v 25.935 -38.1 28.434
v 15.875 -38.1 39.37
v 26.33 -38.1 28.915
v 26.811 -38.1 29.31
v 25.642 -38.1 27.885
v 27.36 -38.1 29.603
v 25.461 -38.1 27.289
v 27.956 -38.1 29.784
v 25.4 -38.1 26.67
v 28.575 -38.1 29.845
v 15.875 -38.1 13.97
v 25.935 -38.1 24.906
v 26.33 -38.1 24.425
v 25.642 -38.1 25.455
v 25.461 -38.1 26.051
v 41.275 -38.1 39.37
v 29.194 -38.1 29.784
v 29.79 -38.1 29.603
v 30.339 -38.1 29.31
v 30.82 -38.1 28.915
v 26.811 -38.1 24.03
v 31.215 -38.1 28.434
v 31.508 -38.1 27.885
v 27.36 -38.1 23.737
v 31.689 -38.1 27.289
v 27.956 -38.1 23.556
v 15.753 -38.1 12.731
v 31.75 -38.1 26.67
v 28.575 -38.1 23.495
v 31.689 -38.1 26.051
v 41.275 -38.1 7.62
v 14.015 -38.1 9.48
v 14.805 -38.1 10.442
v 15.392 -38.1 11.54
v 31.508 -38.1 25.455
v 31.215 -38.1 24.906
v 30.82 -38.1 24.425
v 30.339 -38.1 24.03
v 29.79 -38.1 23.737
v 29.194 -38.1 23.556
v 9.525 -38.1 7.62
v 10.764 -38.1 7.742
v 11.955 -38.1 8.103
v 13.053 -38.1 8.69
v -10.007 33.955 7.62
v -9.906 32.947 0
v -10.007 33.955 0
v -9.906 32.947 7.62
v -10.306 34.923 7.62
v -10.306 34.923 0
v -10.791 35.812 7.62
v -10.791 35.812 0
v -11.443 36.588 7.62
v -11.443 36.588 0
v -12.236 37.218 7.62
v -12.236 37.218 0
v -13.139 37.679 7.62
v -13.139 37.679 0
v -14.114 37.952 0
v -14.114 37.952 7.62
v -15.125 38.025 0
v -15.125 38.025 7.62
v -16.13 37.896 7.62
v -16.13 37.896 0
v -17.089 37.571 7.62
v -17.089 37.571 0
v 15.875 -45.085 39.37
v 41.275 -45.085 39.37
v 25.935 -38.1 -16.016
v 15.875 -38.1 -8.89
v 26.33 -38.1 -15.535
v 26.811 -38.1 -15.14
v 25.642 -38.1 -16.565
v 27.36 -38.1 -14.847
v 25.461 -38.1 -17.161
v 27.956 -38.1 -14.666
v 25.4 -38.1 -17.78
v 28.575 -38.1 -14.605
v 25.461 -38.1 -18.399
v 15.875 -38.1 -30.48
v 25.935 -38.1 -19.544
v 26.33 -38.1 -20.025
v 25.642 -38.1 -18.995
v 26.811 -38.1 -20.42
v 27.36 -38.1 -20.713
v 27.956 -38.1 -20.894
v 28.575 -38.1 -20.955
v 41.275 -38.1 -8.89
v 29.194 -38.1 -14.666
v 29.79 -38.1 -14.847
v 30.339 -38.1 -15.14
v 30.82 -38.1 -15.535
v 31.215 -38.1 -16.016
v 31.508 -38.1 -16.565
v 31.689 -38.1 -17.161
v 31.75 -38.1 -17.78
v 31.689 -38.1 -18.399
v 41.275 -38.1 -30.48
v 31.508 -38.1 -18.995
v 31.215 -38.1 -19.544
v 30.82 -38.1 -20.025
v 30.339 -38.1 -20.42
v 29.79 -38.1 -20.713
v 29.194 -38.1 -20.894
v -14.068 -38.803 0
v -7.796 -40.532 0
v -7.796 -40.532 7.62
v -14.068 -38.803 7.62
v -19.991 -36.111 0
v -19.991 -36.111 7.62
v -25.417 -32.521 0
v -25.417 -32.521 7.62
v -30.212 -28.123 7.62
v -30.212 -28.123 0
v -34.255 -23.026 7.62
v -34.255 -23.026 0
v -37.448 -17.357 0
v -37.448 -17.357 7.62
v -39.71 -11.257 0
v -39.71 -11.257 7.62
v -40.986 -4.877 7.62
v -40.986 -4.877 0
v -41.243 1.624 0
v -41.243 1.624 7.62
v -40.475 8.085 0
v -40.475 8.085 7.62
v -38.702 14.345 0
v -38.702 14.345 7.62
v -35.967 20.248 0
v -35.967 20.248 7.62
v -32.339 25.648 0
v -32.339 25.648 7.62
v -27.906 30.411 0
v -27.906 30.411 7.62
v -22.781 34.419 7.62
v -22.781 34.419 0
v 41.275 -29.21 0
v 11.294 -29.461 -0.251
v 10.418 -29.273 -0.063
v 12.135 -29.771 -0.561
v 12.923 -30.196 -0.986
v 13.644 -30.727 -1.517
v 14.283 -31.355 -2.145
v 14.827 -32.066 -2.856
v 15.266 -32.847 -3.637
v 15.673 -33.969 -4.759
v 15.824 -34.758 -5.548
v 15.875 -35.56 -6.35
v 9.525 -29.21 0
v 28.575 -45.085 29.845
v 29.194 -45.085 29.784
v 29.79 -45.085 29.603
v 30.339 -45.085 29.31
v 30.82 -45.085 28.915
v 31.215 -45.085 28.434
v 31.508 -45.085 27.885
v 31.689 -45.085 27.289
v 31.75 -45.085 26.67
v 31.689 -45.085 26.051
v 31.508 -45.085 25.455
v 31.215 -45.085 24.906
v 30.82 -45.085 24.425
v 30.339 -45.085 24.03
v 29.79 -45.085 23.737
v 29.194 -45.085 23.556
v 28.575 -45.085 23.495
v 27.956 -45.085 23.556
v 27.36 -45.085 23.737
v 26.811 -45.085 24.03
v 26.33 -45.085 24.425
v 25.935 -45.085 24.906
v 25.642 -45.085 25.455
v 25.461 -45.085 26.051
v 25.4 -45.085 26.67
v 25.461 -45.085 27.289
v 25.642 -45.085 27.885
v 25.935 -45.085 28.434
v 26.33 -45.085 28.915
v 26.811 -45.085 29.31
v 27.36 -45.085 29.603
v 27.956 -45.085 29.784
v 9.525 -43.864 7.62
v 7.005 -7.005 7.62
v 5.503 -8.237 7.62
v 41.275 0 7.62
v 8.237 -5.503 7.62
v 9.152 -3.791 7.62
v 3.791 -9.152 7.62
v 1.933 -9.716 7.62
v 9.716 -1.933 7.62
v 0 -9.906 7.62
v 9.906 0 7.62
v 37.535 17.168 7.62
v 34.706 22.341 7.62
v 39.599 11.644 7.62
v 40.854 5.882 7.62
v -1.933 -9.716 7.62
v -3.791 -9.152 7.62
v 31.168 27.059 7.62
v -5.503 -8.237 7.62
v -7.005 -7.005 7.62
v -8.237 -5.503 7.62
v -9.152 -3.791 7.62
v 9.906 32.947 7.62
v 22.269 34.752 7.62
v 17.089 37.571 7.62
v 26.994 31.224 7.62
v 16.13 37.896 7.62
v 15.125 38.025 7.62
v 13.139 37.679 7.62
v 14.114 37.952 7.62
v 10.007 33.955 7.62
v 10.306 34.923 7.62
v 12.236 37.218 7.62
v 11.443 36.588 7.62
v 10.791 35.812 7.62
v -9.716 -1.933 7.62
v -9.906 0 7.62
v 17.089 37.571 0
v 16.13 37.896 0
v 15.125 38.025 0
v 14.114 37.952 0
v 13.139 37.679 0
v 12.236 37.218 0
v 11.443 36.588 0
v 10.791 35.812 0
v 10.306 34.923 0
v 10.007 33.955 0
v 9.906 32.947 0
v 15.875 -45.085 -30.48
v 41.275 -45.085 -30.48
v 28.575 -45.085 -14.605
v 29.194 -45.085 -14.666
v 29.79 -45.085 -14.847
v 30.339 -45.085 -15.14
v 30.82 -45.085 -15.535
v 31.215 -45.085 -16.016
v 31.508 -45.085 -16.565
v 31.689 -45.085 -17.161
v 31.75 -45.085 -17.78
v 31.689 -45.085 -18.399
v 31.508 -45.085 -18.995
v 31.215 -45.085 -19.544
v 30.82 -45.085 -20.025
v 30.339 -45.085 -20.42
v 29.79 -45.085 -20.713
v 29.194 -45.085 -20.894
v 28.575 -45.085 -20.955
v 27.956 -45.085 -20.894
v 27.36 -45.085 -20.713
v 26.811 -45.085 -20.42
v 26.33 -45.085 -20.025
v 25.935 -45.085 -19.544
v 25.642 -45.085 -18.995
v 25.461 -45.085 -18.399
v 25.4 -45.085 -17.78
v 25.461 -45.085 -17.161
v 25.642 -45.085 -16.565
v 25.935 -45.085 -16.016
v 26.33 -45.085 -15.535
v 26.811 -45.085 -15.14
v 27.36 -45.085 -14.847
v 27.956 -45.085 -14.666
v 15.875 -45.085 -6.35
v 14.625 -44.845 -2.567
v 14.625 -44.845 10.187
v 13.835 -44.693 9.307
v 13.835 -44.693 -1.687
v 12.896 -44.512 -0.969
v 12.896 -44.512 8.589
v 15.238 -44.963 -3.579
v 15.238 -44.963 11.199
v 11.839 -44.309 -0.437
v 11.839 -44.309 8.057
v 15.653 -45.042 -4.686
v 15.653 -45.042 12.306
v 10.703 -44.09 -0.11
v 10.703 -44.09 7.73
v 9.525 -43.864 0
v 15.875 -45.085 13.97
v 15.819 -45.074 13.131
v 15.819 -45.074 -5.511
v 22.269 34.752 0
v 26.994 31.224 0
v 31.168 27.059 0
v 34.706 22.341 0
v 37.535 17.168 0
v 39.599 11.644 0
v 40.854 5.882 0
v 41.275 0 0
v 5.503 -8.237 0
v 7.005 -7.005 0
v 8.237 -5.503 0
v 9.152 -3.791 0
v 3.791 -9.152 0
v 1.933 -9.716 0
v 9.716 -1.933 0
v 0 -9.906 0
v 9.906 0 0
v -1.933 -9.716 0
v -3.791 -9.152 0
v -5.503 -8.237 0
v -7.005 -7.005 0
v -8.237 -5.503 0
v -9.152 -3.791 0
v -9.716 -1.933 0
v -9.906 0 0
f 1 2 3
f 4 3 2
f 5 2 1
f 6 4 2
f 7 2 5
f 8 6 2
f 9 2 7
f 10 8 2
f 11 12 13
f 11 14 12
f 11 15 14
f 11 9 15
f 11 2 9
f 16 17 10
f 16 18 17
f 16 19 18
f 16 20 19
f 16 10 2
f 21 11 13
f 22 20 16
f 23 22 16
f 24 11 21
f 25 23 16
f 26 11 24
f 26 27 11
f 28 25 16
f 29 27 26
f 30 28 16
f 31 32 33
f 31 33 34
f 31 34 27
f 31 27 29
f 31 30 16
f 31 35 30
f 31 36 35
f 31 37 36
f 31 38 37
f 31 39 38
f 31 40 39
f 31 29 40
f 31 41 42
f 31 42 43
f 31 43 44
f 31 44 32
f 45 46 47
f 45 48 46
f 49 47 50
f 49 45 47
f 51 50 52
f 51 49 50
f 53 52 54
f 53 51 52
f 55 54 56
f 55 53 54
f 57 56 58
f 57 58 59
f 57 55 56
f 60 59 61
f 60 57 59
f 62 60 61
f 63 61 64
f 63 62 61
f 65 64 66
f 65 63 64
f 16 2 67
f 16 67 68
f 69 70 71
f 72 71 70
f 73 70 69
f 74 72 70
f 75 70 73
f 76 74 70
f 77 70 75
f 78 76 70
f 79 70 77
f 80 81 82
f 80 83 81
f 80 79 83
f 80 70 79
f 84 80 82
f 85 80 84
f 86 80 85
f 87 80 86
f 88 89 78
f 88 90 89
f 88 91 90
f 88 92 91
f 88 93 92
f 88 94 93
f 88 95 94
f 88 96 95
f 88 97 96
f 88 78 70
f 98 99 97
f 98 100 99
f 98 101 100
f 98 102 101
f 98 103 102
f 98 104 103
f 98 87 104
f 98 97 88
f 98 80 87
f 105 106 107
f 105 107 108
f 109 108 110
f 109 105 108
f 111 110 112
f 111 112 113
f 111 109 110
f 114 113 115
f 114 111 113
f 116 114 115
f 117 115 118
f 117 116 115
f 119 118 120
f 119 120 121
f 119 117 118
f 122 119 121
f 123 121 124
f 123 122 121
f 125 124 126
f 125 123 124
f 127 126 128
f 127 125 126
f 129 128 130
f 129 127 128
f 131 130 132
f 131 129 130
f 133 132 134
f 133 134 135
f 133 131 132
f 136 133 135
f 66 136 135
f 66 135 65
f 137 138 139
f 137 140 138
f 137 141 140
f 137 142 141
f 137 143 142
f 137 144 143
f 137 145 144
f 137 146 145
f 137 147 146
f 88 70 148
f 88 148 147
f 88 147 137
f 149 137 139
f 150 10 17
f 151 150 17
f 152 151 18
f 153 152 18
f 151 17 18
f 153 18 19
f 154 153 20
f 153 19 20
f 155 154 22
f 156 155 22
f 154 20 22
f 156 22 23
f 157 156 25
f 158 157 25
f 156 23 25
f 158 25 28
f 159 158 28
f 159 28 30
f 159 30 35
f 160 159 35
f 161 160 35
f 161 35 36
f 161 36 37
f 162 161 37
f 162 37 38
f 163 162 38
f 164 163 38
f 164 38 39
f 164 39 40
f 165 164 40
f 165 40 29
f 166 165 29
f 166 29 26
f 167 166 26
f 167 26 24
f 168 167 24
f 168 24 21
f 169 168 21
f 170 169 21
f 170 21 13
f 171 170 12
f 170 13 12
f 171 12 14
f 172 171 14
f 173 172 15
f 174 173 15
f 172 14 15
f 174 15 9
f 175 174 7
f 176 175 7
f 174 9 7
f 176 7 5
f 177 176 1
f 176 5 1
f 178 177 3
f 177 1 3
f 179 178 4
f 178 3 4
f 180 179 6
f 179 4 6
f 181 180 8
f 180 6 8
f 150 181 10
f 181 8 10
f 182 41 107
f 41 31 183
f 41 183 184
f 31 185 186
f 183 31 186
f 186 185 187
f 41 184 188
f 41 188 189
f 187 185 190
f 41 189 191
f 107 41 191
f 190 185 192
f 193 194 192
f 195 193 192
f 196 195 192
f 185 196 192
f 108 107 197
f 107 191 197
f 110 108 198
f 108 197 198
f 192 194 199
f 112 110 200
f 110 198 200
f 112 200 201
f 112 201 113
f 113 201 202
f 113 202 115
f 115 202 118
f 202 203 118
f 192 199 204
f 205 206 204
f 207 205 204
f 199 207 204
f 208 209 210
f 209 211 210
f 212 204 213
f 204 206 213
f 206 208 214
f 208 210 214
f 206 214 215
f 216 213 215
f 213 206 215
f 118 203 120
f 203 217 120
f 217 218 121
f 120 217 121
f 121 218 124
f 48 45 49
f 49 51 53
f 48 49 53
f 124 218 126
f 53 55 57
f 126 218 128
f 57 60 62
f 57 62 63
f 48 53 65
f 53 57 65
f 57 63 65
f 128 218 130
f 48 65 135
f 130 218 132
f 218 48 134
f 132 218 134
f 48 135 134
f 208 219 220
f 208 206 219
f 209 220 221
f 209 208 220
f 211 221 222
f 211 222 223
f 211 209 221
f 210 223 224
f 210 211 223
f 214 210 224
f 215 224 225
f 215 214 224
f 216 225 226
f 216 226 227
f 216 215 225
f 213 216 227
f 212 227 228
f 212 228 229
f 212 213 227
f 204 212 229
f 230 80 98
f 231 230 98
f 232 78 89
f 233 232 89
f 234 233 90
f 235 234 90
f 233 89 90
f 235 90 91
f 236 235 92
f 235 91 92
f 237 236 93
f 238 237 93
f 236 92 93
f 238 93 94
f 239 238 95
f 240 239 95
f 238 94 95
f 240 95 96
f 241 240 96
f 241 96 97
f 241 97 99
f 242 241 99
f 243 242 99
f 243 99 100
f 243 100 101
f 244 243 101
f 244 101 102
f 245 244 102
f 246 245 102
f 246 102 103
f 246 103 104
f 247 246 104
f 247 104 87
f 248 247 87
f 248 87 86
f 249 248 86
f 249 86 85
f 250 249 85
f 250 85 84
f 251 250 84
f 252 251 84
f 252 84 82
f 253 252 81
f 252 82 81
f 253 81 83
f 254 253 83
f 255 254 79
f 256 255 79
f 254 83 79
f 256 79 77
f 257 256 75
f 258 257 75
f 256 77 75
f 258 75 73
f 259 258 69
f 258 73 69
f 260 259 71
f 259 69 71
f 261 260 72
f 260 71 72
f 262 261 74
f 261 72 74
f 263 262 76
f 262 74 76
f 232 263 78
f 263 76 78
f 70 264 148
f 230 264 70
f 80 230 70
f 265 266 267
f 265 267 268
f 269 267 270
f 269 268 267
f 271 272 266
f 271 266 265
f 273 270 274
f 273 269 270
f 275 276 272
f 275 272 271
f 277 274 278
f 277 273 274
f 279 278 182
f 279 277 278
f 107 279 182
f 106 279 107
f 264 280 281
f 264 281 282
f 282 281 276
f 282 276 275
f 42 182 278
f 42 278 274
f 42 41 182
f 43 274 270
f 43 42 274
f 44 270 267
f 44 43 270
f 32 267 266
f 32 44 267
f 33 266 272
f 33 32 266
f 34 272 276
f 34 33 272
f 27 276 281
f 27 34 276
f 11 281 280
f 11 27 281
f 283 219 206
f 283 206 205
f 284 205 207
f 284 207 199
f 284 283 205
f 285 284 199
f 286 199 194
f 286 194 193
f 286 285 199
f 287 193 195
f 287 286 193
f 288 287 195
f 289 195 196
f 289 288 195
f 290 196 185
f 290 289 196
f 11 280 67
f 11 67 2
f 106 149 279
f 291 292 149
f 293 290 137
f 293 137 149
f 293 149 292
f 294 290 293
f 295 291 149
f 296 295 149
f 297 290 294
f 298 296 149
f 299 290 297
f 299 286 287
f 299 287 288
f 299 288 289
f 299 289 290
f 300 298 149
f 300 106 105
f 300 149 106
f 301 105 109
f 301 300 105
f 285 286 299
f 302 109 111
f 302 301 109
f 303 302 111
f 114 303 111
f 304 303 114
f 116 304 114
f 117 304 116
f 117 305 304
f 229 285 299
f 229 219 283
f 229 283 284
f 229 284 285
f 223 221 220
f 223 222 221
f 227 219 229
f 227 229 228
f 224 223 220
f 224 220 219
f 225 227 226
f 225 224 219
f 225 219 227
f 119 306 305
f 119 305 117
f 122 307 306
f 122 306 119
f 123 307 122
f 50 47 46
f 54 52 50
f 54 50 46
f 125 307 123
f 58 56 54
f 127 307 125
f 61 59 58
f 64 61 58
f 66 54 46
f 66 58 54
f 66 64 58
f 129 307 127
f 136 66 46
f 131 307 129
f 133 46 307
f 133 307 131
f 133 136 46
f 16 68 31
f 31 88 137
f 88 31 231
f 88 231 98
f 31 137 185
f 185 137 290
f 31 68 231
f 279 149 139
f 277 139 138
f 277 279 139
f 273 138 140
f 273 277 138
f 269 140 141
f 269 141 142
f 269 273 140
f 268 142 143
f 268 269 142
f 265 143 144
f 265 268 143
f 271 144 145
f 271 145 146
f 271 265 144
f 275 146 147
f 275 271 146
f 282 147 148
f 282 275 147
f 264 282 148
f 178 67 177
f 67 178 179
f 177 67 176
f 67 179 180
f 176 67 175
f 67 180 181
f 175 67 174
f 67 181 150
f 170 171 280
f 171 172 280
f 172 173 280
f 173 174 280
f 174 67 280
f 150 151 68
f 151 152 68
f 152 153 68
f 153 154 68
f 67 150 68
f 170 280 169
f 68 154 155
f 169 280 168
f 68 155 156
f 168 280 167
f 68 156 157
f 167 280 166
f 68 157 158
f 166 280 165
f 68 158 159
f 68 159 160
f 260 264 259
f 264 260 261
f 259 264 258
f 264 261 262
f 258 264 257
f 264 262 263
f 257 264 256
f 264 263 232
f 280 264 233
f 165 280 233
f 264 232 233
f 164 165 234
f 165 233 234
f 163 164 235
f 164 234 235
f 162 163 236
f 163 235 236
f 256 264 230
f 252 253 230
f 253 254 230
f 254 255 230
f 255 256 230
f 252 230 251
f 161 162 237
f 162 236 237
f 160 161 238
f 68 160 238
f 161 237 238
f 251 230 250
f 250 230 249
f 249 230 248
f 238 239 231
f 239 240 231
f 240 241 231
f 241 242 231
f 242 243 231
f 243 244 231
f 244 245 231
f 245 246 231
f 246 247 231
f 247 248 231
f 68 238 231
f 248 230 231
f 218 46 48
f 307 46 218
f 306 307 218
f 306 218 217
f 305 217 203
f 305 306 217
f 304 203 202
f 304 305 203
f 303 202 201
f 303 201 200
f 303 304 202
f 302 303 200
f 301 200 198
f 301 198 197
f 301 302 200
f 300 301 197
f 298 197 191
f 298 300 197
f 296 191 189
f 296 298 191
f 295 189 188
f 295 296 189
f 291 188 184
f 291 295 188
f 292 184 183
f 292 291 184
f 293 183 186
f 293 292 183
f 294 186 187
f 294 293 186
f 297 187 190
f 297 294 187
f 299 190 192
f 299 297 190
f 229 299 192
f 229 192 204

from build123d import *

# Parameters (mm, degrees)
BOSS_EXTRUDE1_DEPTH      = 7.62
BOSS_EXTRUDE2_DEPTH      = 31.75
BOSS_EXTRUDE2_DEPTH_BACK = 38.1
SKETCH2_W                = 25.4
SKETCH2_H                = 6.985
BOSS_EXTRUDE3_START      = -7.62
BOSS_EXTRUDE3_DEPTH      = 7.62
SKETCH4_R                = 3.175
CUT_EXTRUDE1_DEPTH       = 7.62
CHAMFER1_SIZE            = 8.89
FILLET1_R                = 6.35
FILLET2_R                = 5.08


with BuildPart() as part:
    # Sketch1 → Boss-Extrude1 (new body)
    with BuildSketch(Plane.XY):
        with BuildLine():
            Line((41.275, -41.275), (0, -41.275))
            ThreePointArc((0, -41.275), (-40.972302797, -4.989592018), (-9.906, 40.068650951))
            Line((-9.906, 40.068650951), (-9.906, 0))
            ThreePointArc((-9.906, 0), (0, -9.906), (9.906, 0))
            Line((9.906, 0), (9.906, 40.068650951))
            ThreePointArc((9.906, 40.068650951), (32.4999675, 25.443618797), (41.275, 0))
            Line((41.275, 0), (41.275, -41.275))
        make_face()
    extrude(amount=BOSS_EXTRUDE1_DEPTH)

    # Sketch2 → Boss-Extrude2 (add, two sides: drawn at the far end of the back side and taken through both)
    with BuildSketch(Plane.XY.offset(7.62).offset(-BOSS_EXTRUDE2_DEPTH_BACK)):
        with Locations((28.575, -41.5925)):
            Rectangle(SKETCH2_W, SKETCH2_H)
    extrude(amount=BOSS_EXTRUDE2_DEPTH + BOSS_EXTRUDE2_DEPTH_BACK)

    # Sketch3 → Boss-Extrude3 (add)
    with BuildSketch(Plane.XY.offset(7.62).offset(BOSS_EXTRUDE3_START)):
        with BuildLine():
            Line((15.875, -45.085), (-7.79603534, -40.532054697))
            ThreePointArc((-7.79603534, -40.532054697), (-3.915677934, -41.088843879), (0, -41.275))
            Line((0, -41.275), (15.875, -41.275))
            Line((15.875, -41.275), (15.875, -45.085))
        make_face()
    extrude(amount=BOSS_EXTRUDE3_DEPTH)

    # Sketch4 → Cut-Extrude1 (cut)
    with BuildSketch(Plane(origin=(0, -38.1, 0), x_dir=(1, 0, 0), z_dir=(0, 1, 0))):
        with Locations(Location((28.575, -26.67, 0), (0, 0, 270))):
            Circle(SKETCH4_R)
        with Locations(Location((28.575, 17.78, 0), (0, 0, 270))):
            Circle(SKETCH4_R)
    extrude(amount=-CUT_EXTRUDE1_DEPTH, mode=Mode.SUBTRACT)

    # Chamfer1
    chamfer1_edges = [part.edges().sort_by_distance(p)[0] for p in [
        (28.575, -38.1, 0),
    ]]
    chamfer(chamfer1_edges, length=CHAMFER1_SIZE)

    # Fillet1
    fillet1_edges = [part.edges().sort_by_distance(p)[0] for p in [
        (15.875, -37.1475, 0),
        (15.875, -41.5925, 7.62),
    ]]
    fillet(fillet1_edges, radius=FILLET1_R)

    # Fillet2
    fillet2_edges = [part.edges().sort_by_distance(p)[0] for p in [
        (9.906, 40.068650951, 3.81),
        (-9.906, 40.068650951, 3.81),
    ]]
    fillet(fillet2_edges, radius=FILLET2_R)


solid = part.part
